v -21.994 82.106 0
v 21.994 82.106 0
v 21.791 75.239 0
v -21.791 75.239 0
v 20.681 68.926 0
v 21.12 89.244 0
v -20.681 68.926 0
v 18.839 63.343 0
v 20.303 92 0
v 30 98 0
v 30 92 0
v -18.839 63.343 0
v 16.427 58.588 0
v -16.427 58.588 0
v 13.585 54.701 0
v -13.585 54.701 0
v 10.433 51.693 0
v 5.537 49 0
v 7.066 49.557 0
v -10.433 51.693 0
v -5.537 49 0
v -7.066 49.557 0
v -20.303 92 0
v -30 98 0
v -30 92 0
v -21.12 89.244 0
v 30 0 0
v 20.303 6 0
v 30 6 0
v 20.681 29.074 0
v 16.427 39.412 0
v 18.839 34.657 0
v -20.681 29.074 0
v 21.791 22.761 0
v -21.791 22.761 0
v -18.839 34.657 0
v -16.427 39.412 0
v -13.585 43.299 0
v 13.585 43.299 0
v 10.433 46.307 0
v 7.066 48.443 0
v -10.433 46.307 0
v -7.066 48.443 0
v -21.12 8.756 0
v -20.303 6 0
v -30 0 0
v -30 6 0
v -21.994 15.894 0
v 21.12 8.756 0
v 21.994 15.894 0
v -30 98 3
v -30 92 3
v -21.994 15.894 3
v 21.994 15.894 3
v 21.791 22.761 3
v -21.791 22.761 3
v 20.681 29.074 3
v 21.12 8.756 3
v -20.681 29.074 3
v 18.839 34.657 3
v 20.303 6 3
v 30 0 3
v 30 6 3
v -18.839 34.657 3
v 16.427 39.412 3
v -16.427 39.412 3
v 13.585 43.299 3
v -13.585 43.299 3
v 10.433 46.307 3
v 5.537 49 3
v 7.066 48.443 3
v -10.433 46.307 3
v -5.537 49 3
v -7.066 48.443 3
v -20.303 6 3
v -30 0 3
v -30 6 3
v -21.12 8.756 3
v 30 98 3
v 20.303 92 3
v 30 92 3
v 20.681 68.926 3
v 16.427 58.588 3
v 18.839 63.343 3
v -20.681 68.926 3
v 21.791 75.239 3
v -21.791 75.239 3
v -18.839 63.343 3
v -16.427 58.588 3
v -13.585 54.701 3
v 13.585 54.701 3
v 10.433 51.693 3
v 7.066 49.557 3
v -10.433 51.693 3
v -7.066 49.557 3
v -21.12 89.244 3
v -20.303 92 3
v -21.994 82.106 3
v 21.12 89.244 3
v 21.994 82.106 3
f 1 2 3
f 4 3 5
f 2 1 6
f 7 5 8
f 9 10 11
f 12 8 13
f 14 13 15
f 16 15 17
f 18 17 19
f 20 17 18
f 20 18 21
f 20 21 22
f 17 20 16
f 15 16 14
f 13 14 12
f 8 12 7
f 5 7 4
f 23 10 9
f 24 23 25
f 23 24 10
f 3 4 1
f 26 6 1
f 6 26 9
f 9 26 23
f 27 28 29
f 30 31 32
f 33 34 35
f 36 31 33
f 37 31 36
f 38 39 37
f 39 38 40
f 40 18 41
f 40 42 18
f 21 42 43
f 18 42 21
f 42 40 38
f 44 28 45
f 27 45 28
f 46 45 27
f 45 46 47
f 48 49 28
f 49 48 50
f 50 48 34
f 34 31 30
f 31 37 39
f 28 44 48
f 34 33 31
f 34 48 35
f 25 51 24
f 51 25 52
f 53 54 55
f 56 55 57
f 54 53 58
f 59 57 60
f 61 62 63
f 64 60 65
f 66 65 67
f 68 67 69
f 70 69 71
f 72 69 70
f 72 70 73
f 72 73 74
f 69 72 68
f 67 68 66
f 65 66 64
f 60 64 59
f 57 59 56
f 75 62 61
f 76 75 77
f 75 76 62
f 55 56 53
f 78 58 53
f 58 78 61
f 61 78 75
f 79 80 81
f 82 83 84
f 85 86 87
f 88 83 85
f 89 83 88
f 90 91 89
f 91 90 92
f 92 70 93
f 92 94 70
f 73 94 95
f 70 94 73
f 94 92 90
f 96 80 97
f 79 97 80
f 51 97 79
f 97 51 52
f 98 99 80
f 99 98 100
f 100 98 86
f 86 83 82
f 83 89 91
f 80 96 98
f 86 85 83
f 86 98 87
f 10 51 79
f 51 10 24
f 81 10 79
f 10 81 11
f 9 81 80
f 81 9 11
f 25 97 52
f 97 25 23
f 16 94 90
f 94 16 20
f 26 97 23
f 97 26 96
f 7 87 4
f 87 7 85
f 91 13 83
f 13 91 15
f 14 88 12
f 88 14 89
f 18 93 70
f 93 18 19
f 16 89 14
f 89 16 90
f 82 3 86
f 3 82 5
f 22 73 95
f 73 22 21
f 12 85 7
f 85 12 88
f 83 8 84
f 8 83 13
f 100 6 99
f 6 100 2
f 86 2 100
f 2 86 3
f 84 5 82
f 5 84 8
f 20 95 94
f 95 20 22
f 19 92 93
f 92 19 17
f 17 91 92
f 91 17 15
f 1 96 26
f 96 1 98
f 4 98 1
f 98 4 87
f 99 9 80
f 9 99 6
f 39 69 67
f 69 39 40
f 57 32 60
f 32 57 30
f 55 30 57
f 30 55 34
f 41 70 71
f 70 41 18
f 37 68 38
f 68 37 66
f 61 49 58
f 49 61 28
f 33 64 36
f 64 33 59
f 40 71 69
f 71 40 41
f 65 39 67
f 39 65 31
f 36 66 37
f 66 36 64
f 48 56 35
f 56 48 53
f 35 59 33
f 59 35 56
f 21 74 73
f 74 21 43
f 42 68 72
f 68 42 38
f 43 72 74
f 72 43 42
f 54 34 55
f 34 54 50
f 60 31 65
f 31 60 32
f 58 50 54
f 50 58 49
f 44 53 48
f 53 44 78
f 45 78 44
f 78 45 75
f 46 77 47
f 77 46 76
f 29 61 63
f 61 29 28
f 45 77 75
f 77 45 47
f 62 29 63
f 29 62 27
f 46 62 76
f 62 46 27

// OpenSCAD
// file: ../horseshoe/horseshoe.scad
horseshoe();

module horseshoe()
{
    linear_extrude(height=3)
    difference() 
    { 
        horseshoeProjection();
        
        translate ([0, -1, 0])
        scale ([0.85, .9, 1]) 
        horseshoeProjection();
    }
}

module horseshoeProjection()
{
	rotate ([0, 0, 90])
	translate ([45, 0, 0]) 
	projection(cut=true) // the projection is from http://blog.bangsplatpresents.com/?p=1123
	{
		translate( v=[0,0,25] ) 
		{
			rotate( a=[0,45,0] ) 
			{
				cylinder( r1=25, r2=0, h=100, center=true );
			}
		}
	}
}
// main file
use <../horseshoe/horseshoe.scad>;


translate ([0, 49, 0])
hourglass();

module hourglass()
{
	union () 
	{ 
		// top bar
		bar();
		
		// top glass
		rotate ([0, 0, 180]) 
		translate ([0, -43, 0])
		color("teal")
		linear_extrude(height=3)
		horseshoeProjection();

		// botton glass
		translate ([0, -43, 0])
		linear_extrude(height=3)
		horseshoeProjection();
		
		// bottom bar
		translate ([0, -92, 0]) 
		bar();
	}
}

module bar()
{
    translate ([-30, 43, 0]) 
    color ("black")
    linear_extrude(height=3)
    square ([60 , 6]);
}
